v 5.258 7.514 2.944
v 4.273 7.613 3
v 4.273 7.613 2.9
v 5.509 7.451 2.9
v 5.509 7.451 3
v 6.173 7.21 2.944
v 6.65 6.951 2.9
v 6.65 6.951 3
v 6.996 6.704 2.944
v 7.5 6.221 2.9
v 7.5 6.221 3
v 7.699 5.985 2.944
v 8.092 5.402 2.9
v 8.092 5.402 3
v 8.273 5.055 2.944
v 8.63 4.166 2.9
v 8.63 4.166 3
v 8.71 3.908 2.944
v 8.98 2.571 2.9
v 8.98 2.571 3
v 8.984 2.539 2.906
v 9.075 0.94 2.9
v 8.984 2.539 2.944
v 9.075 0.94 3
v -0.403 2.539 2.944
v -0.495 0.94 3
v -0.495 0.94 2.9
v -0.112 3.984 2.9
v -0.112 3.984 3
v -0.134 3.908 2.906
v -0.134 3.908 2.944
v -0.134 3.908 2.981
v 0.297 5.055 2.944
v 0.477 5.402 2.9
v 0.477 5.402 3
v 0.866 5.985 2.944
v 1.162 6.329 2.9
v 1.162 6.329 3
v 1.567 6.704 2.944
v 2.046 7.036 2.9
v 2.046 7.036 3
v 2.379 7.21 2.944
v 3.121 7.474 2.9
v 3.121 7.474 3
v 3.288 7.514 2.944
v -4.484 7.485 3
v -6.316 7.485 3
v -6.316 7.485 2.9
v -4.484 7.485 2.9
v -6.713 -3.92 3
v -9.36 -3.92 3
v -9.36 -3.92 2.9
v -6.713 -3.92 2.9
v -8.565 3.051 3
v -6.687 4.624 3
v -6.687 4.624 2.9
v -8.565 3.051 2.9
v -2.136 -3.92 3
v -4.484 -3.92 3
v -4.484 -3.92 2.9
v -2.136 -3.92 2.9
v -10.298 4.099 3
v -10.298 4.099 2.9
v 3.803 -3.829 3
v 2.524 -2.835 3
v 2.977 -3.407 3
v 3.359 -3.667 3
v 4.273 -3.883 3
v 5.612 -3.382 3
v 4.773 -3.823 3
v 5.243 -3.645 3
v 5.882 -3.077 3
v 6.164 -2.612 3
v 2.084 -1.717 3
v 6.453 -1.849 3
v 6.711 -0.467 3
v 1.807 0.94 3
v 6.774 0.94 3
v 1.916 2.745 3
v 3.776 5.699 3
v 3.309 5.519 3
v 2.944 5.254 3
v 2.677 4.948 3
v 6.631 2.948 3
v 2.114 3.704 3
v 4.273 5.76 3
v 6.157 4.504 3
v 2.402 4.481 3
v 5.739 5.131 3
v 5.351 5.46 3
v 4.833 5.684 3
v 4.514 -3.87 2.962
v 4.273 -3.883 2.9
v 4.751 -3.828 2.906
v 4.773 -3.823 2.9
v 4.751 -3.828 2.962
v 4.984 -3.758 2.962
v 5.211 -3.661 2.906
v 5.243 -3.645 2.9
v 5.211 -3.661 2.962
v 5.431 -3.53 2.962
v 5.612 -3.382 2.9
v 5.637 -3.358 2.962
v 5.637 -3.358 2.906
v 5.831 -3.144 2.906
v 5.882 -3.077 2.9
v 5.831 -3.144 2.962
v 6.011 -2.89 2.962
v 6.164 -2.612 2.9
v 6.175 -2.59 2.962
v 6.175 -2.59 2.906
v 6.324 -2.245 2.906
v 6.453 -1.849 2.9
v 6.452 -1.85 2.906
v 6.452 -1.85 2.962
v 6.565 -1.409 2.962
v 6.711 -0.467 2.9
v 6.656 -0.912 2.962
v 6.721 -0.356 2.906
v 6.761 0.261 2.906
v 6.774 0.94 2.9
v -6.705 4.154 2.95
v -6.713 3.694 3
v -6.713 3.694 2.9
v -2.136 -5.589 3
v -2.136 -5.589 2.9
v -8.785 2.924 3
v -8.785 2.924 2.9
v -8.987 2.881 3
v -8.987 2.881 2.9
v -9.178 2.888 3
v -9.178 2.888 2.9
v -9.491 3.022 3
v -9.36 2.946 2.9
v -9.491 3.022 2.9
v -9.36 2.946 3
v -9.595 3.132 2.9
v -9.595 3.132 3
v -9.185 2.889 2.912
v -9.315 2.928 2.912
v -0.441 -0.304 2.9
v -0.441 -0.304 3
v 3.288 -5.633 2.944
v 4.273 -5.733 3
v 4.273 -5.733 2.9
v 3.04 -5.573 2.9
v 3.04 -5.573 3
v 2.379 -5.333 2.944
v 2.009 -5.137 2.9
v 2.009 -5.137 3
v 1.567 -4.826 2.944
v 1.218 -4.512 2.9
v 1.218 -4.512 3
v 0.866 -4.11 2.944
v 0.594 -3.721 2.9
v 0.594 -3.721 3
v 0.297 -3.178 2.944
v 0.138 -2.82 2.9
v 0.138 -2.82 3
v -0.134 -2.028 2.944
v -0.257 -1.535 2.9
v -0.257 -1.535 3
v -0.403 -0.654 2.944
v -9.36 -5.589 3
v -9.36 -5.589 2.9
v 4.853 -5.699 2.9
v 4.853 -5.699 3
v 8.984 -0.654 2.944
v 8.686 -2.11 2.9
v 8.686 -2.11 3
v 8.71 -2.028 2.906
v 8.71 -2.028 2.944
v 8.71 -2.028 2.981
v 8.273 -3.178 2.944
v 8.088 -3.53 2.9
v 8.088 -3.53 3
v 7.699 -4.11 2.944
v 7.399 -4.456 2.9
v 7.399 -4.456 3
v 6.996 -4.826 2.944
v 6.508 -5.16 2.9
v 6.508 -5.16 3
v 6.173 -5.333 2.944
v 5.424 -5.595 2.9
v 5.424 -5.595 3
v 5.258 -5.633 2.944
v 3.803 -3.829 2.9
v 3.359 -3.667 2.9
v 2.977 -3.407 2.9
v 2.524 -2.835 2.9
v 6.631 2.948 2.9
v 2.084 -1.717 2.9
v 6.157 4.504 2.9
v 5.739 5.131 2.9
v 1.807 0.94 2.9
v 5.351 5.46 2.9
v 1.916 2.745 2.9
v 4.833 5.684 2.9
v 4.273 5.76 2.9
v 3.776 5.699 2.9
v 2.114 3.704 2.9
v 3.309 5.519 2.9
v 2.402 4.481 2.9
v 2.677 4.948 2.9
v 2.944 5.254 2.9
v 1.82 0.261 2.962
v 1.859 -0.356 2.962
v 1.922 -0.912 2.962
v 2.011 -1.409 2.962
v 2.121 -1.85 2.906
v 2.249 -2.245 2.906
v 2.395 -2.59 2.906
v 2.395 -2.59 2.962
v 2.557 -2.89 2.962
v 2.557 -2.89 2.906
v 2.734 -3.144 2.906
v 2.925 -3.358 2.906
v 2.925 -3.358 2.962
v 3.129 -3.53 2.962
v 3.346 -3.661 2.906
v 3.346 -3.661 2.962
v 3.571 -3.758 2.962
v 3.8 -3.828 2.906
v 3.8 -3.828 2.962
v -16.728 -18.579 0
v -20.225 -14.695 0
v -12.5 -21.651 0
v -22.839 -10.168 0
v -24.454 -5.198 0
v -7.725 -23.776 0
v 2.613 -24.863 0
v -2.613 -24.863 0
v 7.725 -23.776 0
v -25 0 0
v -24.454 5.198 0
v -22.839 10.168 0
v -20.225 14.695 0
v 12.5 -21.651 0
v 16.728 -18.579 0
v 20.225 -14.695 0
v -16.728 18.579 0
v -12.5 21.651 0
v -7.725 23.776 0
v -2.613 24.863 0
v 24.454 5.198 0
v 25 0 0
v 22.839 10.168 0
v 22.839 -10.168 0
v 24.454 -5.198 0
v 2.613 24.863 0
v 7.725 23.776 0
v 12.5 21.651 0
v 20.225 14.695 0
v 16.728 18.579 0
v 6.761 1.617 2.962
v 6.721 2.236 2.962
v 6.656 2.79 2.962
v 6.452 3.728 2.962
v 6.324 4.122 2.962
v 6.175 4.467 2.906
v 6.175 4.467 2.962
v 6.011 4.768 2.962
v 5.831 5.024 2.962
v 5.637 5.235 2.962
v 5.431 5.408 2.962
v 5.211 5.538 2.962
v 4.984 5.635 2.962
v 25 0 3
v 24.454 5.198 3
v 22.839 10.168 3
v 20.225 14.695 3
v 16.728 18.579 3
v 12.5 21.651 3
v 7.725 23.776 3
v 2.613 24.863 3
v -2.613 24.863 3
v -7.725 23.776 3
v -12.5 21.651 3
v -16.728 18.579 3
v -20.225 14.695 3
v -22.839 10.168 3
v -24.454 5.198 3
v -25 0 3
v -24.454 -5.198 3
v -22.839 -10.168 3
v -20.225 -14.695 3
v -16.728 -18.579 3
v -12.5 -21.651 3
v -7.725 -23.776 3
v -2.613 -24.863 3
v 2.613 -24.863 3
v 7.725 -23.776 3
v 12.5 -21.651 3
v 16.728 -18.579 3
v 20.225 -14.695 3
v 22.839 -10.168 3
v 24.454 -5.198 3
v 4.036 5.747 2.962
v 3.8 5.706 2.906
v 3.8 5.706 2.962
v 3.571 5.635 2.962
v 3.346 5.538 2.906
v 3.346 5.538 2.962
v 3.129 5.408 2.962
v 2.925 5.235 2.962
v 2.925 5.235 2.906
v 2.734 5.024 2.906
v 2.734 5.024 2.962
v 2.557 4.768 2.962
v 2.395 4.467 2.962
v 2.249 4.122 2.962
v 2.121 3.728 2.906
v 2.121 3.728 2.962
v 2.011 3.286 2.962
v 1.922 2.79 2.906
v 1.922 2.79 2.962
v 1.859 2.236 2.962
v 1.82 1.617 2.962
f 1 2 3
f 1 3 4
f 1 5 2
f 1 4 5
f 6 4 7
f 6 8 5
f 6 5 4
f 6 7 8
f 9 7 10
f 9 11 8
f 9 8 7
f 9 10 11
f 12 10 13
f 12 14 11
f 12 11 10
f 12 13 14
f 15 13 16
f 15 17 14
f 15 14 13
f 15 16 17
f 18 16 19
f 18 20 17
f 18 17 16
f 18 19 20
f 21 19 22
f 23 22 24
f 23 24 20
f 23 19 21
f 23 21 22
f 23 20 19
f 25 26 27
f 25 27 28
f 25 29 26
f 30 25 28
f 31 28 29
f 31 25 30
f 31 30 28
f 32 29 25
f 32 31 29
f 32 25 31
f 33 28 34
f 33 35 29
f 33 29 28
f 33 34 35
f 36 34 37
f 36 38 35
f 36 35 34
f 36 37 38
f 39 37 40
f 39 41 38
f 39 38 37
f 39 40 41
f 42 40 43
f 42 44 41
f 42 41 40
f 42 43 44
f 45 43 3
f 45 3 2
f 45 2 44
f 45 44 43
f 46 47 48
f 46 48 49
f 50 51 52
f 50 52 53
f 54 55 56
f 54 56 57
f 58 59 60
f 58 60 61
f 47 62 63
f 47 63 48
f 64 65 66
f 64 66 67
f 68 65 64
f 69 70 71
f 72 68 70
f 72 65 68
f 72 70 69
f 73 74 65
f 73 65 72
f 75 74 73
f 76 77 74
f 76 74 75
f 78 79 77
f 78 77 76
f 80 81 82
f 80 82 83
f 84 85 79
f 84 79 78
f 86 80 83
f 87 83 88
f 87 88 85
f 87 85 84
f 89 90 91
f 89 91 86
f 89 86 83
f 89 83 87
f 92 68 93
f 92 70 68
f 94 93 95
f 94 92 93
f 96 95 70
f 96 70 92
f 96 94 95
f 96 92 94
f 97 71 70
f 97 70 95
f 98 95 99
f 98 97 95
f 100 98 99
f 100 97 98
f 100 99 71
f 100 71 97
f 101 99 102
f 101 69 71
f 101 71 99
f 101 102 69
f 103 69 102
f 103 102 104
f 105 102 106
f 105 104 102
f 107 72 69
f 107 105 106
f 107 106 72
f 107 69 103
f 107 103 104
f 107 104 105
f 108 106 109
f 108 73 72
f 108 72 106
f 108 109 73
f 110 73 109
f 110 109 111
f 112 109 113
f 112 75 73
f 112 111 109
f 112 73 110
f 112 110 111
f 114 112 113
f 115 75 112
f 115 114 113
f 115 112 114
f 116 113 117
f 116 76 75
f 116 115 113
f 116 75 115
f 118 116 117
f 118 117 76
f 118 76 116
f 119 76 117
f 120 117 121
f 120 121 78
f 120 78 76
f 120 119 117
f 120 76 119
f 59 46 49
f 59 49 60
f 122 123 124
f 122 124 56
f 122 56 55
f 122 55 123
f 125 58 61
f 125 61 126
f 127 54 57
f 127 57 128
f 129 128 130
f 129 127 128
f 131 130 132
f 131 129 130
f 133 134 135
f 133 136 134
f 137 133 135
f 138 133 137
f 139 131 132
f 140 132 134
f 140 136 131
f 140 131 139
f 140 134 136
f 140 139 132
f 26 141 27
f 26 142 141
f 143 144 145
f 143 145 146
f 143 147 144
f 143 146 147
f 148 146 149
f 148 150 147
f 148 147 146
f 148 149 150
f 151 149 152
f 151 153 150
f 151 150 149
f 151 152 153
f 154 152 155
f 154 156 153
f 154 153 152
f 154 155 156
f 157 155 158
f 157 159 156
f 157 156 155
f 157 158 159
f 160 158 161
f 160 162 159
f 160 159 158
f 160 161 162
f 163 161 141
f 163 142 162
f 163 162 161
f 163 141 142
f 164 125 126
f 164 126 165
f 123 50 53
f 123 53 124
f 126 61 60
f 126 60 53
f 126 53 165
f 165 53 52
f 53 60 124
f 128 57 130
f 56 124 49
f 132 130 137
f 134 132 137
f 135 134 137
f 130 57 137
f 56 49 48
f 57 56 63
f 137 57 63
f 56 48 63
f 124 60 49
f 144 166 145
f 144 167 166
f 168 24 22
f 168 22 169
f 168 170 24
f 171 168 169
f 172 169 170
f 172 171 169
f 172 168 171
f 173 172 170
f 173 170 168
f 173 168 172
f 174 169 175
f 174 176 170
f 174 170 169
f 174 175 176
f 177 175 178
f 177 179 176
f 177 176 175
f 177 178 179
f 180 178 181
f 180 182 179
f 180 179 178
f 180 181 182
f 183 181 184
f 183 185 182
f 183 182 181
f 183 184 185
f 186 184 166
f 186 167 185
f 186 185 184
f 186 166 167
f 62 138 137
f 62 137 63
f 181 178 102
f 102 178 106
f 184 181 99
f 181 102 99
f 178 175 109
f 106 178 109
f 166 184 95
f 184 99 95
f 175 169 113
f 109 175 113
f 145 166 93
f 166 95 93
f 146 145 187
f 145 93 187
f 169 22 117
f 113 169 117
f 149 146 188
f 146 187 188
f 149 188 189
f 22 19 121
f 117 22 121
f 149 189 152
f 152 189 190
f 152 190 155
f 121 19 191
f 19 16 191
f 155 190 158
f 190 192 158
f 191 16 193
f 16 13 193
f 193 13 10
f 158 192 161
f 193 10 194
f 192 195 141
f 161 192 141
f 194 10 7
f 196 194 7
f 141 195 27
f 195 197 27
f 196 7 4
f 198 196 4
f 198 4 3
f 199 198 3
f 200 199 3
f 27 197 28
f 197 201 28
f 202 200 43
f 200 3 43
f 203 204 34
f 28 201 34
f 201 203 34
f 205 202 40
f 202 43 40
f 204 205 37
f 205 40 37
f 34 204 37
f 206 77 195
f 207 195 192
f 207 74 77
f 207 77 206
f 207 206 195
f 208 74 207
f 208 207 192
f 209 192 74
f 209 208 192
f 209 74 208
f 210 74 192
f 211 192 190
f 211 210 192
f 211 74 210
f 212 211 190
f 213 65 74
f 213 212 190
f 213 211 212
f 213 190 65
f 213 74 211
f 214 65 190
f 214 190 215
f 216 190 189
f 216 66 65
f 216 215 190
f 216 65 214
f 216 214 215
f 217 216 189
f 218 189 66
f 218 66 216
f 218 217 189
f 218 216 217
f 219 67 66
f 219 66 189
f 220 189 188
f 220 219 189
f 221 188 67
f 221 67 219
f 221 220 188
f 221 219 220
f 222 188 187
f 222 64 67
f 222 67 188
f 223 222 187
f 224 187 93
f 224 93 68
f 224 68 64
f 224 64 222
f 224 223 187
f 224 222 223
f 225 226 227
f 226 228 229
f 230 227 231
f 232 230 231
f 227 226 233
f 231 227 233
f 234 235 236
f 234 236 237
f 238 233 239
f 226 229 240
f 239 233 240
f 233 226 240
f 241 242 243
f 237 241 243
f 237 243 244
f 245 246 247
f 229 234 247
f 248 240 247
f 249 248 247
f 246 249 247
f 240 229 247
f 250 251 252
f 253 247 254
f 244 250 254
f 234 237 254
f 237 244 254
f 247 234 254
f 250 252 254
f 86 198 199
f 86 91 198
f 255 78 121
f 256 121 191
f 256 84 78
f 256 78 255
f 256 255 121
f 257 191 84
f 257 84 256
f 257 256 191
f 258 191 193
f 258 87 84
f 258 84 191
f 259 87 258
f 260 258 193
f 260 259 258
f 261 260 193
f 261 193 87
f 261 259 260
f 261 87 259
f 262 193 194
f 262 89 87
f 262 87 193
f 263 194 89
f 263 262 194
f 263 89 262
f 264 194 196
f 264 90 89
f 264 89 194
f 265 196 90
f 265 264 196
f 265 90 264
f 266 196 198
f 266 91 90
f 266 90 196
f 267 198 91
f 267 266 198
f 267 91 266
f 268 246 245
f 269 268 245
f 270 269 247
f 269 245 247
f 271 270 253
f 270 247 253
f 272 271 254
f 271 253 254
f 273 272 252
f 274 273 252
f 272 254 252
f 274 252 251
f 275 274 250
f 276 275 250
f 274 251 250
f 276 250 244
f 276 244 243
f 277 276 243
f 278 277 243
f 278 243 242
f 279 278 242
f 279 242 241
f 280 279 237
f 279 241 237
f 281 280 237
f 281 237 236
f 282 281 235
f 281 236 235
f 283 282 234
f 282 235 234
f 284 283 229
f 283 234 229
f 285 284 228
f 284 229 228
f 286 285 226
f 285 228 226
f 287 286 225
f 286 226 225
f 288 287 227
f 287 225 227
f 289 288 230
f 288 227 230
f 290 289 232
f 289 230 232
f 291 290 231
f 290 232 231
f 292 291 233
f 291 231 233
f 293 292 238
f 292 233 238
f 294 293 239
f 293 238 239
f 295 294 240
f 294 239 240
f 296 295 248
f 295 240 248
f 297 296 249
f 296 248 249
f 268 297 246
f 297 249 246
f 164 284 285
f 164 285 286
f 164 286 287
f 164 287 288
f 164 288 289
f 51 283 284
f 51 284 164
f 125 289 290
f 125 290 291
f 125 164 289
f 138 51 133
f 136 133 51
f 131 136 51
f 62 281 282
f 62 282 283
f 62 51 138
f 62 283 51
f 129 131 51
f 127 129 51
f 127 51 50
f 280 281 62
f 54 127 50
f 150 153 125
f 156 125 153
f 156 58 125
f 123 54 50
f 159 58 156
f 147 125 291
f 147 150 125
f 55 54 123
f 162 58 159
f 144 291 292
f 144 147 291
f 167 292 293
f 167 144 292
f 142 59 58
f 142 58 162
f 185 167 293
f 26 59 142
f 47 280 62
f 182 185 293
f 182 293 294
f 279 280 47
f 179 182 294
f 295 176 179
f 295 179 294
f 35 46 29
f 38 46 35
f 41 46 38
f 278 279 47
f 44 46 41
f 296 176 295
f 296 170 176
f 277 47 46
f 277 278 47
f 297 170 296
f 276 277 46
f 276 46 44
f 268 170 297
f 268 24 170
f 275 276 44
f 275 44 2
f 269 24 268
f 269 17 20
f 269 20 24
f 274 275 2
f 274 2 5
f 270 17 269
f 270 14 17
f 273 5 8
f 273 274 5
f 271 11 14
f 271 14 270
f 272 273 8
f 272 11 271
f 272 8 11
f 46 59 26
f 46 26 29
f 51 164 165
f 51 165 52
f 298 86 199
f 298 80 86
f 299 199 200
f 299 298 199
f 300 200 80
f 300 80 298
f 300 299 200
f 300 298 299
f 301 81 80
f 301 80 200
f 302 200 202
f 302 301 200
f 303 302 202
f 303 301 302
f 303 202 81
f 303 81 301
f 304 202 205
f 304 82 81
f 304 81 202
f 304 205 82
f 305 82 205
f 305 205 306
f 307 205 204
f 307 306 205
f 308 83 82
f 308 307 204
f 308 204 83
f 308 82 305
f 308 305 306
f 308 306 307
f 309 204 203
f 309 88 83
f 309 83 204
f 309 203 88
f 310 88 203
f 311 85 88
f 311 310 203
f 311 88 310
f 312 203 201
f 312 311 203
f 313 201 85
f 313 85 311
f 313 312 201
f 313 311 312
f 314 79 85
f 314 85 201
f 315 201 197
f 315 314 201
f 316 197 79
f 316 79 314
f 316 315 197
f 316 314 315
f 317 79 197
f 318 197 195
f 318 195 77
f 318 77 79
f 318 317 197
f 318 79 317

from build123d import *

# Parameters (mm, degrees)
SKETCH1_R           = 25
BOSS_EXTRUDE1_DEPTH = 3
CUT_EXTRUDE1_DEPTH  = 0.1


with BuildPart() as part:
    # Sketch1 → Boss-Extrude1 (new body)
    with BuildSketch(Plane(origin=(0, 0, 0), x_dir=(0, 1, 0), z_dir=(0, 0, 1))):
        with Locations(Location((0, 0, 0), (0, 0, 270))):
            Circle(SKETCH1_R)
    extrude(amount=BOSS_EXTRUDE1_DEPTH)

    # Sketch3 → Cut-Extrude1 (cut)
    # profile 1 of 2: a face of its own
    with BuildSketch(Plane.XY.offset(3)):
        with BuildLine():
            Line((-2.135536589, -3.91952773), (-2.135536589, -5.589026656))
            Line((-2.135536589, -5.589026656), (-9.359581237, -5.589026656))
            Line((-9.359581237, -5.589026656), (-9.359581237, -3.91952773))
            Line((-9.359581237, -3.91952773), (-6.712942094, -3.91952773))
            Line((-6.712942094, -3.91952773), (-6.712942094, 3.6938054))
            add(Edge.make_bspline(
                [(-6.712942094, 3.6938054), (-6.711155885, 3.847105408), (-6.707541754, 4.157285237), (-6.693777105, 4.467181218), (-6.686815351, 4.623917478)],
                knots=[0, 0, 0, 0, 0.98845891, 2, 2, 2, 2], degree=3))
            Line((-6.686815351, 4.623917478), (-8.565328227, 3.051087504))
            add(Edge.make_bspline(
                [(-8.565328227, 3.051087504), (-8.617759942, 3.014331802), (-8.716372329, 2.945202508), (-8.880339811, 2.88896631), (-9.036125684, 2.875345654), (-9.18237461, 2.882130045), (-9.313965386, 2.925554364), (-9.431240682, 2.977107644), (-9.527057416, 3.04704147), (-9.573128253, 3.104942057), (-9.594721931, 3.132080409)],
                knots=[0, 0, 0, 0, 1.335478134, 2.511737127, 3.574879376, 4.598514131, 5.550291057, 6.455707661, 7.276180923, 8, 8, 8, 8], degree=3))
            Line((-9.594721931, 3.132080409), (-10.297531338, 4.098769928))
            Line((-10.297531338, 4.098769928), (-6.315815589, 7.484795919))
            Line((-6.315815589, 7.484795919), (-4.484330852, 7.484795919))
            Line((-4.484330852, 7.484795919), (-4.484330852, -3.91952773))
            Line((-4.484330852, -3.91952773), (-2.135536589, -3.91952773))
        make_face()
    # profile 2 of 2: a face of its own
    with BuildSketch(Plane.XY.offset(3)):
        with BuildLine():
            add(Edge.make_bspline(
                [(9.075449156, 0.940046608), (9.071019121, 0.664701426), (9.062453061, 0.132285105), (8.994417033, -0.639500558), (8.881176325, -1.355733726), (8.722500681, -2.017311728), (8.521457839, -2.6215582), (8.285804124, -3.171554325), (8.017952132, -3.668932341), (7.711163277, -4.110013082), (7.372230822, -4.49674732), (7.00440566, -4.832496752), (6.604657821, -5.113627074), (6.176960126, -5.341859495), (5.726135225, -5.515862981), (5.257991212, -5.64302657), (4.771230439, -5.71676622), (4.440808731, -5.727356618), (4.273353654, -5.732723747)],
                knots=[0, 0, 0, 0, 1.427761042, 2.760764776, 4.014112494, 5.185114878, 6.284837347, 7.312563931, 8.284692091, 9.209319466, 10.092619187, 10.946314317, 11.785842449, 12.620313761, 13.453990262, 14.286626251, 15.131675901, 16, 16, 16, 16], degree=3))
            add(Edge.make_bspline(
                [(4.273353654, -5.732723747), (4.105903463, -5.727337226), (3.775491393, -5.716708563), (3.28949381, -5.643374433), (2.823176442, -5.515750192), (2.375519546, -5.342384412), (1.952183128, -5.113690706), (1.557547903, -4.830750182), (1.190020452, -4.497705935), (0.853943156, -4.109729476), (0.54959844, -3.66884397), (0.284444452, -3.171414662), (0.051406307, -2.621436329), (-0.146966158, -2.017182795), (-0.303219138, -1.355635346), (-0.412983668, -0.639255268), (-0.481995779, 0.132254791), (-0.490420263, 0.664691092), (-0.494777081, 0.940046608)],
                knots=[0, 0, 0, 0, 0.870312425, 1.717297107, 2.547469919, 3.378839009, 4.207245088, 5.041308741, 5.896958699, 6.779301806, 7.703466893, 8.675663034, 9.703960984, 10.804778541, 11.977405589, 13.232913505, 14.568969609, 16, 16, 16, 16], degree=3))
            add(Edge.make_bspline(
                [(-0.494777081, 0.940046608), (-0.490395372, 1.216269227), (-0.48192189, 1.750436948), (-0.413378742, 2.522881329), (-0.303182258, 3.238353368), (-0.14706114, 3.897338419), (0.051897585, 4.499634222), (0.284526412, 5.048825866), (0.54881735, 5.545984912), (0.854669604, 5.98502091), (1.190812097, 6.372527453), (1.556644922, 6.708377286), (1.952311151, 6.990983264), (2.375424524, 7.220136663), (2.823644607, 7.392411155), (3.289018042, 7.524330183), (3.775555765, 7.59656853), (4.105925113, 7.607351991), (4.273353654, 7.612816963)],
                knots=[0, 0, 0, 0, 1.435879915, 2.776748353, 4.028067345, 5.196555383, 6.293321804, 7.321852275, 8.294268251, 9.214920023, 10.097462647, 10.956354759, 11.790607013, 12.619200412, 13.450757493, 14.282314574, 15.129490778, 16, 16, 16, 16], degree=3))
            add(Edge.make_bspline(
                [(4.273353654, 7.612816963), (4.440787348, 7.607371921), (4.771166865, 7.596627784), (5.258463213, 7.523978149), (5.725669157, 7.392522252), (6.177055392, 7.219613418), (6.60452845, 6.990917769), (7.005314836, 6.710131059), (7.371436101, 6.371566293), (7.710433994, 5.985297187), (8.018735703, 5.546079999), (8.285722605, 5.048964987), (8.520961624, 4.499752358), (8.722595975, 3.897468449), (8.881140026, 3.238452128), (8.994817843, 2.52312835), (9.06237705, 1.750406214), (9.070993512, 1.216258751), (9.075449156, 0.940046608)],
                knots=[0, 0, 0, 0, 0.868519118, 1.713758561, 2.547769124, 3.381632863, 4.216291591, 5.056008275, 5.912936842, 6.796434946, 7.717566584, 8.689913077, 9.717870481, 10.813555276, 11.980430531, 13.229599676, 14.567402704, 16, 16, 16, 16], degree=3))
        make_face()
        with BuildLine():
            add(Edge.make_bspline(
                [(6.773683032, 0.940046608), (6.77138159, 1.165667325), (6.766970374, 1.598118622), (6.728307454, 2.215549989), (6.664537347, 2.773177449), (6.573734771, 3.271486255), (6.459730373, 3.715657268), (6.335426284, 4.112484148), (6.184804403, 4.459488084), (6.021296706, 4.762466776), (5.841121054, 5.020853425), (5.645543659, 5.235343664), (5.438884475, 5.411292967), (5.216254332, 5.542223154), (4.986608258, 5.638348235), (4.753221726, 5.71009288), (4.514460938, 5.753355227), (4.353647187, 5.758074514), (4.273353654, 5.760430831)],
                knots=[0, 0, 0, 0, 1.791502552, 3.433805244, 4.910094652, 6.246187574, 7.452181068, 8.550059512, 9.544407747, 10.451236363, 11.280112373, 12.038857448, 12.750772576, 13.426816362, 14.080634448, 14.723832631, 15.362815766, 16, 16, 16, 16], degree=3))
            add(Edge.make_bspline(
                [(4.273353654, 5.760430831), (4.193929125, 5.758074214), (4.034841366, 5.753353899), (3.79867417, 5.710082057), (3.567895178, 5.638325997), (3.34083945, 5.542172118), (3.120806553, 5.411186913), (2.916795755, 5.235215966), (2.723856864, 5.020694951), (2.546375935, 4.762292593), (2.385287867, 4.459402243), (2.238157676, 4.111833538), (2.112289385, 3.71612128), (2.002158784, 3.271274037), (1.913387308, 2.773117016), (1.853202684, 2.215358755), (1.813457884, 1.598145015), (1.809206893, 1.165676374), (1.806989044, 0.940046608)],
                knots=[0, 0, 0, 0, 0.632503036, 1.266906969, 1.905736897, 2.555481396, 3.22795667, 3.937072042, 4.693831014, 5.521656093, 6.428370863, 7.423497167, 8.525249946, 9.733806716, 11.073374713, 12.554077104, 14.202175365, 16, 16, 16, 16], degree=3))
            add(Edge.make_bspline(
                [(1.806989044, 0.940046608), (1.809150434, 0.713542452), (1.813277296, 0.281065434), (1.853525525, -0.336977132), (1.913149895, -0.894791395), (2.002172463, -1.393796121), (2.112305148, -1.838626066), (2.238092594, -2.234402012), (2.385500536, -2.581763606), (2.545349233, -2.884693439), (2.725631944, -3.140918115), (2.915791122, -3.357748528), (3.120931921, -3.533598875), (3.340807832, -3.664718687), (3.56790337, -3.760838431), (3.798672018, -3.832603361), (4.034841901, -3.875872898), (4.193929303, -3.88059352), (4.273353654, -3.882950289)],
                knots=[0, 0, 0, 0, 1.804043418, 3.444560704, 4.931565859, 6.27059941, 7.478674004, 8.579987218, 9.574716498, 10.481069517, 11.302874194, 12.064498727, 12.773331185, 13.445538162, 14.095023433, 14.733598488, 15.367749313, 16, 16, 16, 16], degree=3))
            add(Edge.make_bspline(
                [(4.273353654, -3.882950289), (4.353647007, -3.880593815), (4.514460398, -3.875874216), (4.753223901, -3.832614228), (4.986599988, -3.760860505), (5.21628622, -3.664770329), (5.438758244, -3.533702706), (5.646550427, -3.357890125), (5.839340697, -3.14105262), (6.022326866, -2.884880989), (6.184591644, -2.581847144), (6.335491123, -2.235053157), (6.459714851, -1.838161923), (6.573720226, -1.394008202), (6.664781663, -0.894853631), (6.727975633, -0.337166314), (6.767152111, 0.281091524), (6.771438232, 0.713551419), (6.773683032, 0.940046608)],
                knots=[0, 0, 0, 0, 0.636931218, 1.275660623, 1.918603401, 2.572161866, 3.247937206, 3.959569644, 4.723131429, 5.546035468, 6.452503996, 7.44645739, 8.543899885, 9.749414497, 11.084976877, 12.567545687, 14.202297145, 16, 16, 16, 16], degree=3))
        make_face(mode=Mode.SUBTRACT)
    extrude(amount=-CUT_EXTRUDE1_DEPTH, mode=Mode.SUBTRACT)


solid = part.part
